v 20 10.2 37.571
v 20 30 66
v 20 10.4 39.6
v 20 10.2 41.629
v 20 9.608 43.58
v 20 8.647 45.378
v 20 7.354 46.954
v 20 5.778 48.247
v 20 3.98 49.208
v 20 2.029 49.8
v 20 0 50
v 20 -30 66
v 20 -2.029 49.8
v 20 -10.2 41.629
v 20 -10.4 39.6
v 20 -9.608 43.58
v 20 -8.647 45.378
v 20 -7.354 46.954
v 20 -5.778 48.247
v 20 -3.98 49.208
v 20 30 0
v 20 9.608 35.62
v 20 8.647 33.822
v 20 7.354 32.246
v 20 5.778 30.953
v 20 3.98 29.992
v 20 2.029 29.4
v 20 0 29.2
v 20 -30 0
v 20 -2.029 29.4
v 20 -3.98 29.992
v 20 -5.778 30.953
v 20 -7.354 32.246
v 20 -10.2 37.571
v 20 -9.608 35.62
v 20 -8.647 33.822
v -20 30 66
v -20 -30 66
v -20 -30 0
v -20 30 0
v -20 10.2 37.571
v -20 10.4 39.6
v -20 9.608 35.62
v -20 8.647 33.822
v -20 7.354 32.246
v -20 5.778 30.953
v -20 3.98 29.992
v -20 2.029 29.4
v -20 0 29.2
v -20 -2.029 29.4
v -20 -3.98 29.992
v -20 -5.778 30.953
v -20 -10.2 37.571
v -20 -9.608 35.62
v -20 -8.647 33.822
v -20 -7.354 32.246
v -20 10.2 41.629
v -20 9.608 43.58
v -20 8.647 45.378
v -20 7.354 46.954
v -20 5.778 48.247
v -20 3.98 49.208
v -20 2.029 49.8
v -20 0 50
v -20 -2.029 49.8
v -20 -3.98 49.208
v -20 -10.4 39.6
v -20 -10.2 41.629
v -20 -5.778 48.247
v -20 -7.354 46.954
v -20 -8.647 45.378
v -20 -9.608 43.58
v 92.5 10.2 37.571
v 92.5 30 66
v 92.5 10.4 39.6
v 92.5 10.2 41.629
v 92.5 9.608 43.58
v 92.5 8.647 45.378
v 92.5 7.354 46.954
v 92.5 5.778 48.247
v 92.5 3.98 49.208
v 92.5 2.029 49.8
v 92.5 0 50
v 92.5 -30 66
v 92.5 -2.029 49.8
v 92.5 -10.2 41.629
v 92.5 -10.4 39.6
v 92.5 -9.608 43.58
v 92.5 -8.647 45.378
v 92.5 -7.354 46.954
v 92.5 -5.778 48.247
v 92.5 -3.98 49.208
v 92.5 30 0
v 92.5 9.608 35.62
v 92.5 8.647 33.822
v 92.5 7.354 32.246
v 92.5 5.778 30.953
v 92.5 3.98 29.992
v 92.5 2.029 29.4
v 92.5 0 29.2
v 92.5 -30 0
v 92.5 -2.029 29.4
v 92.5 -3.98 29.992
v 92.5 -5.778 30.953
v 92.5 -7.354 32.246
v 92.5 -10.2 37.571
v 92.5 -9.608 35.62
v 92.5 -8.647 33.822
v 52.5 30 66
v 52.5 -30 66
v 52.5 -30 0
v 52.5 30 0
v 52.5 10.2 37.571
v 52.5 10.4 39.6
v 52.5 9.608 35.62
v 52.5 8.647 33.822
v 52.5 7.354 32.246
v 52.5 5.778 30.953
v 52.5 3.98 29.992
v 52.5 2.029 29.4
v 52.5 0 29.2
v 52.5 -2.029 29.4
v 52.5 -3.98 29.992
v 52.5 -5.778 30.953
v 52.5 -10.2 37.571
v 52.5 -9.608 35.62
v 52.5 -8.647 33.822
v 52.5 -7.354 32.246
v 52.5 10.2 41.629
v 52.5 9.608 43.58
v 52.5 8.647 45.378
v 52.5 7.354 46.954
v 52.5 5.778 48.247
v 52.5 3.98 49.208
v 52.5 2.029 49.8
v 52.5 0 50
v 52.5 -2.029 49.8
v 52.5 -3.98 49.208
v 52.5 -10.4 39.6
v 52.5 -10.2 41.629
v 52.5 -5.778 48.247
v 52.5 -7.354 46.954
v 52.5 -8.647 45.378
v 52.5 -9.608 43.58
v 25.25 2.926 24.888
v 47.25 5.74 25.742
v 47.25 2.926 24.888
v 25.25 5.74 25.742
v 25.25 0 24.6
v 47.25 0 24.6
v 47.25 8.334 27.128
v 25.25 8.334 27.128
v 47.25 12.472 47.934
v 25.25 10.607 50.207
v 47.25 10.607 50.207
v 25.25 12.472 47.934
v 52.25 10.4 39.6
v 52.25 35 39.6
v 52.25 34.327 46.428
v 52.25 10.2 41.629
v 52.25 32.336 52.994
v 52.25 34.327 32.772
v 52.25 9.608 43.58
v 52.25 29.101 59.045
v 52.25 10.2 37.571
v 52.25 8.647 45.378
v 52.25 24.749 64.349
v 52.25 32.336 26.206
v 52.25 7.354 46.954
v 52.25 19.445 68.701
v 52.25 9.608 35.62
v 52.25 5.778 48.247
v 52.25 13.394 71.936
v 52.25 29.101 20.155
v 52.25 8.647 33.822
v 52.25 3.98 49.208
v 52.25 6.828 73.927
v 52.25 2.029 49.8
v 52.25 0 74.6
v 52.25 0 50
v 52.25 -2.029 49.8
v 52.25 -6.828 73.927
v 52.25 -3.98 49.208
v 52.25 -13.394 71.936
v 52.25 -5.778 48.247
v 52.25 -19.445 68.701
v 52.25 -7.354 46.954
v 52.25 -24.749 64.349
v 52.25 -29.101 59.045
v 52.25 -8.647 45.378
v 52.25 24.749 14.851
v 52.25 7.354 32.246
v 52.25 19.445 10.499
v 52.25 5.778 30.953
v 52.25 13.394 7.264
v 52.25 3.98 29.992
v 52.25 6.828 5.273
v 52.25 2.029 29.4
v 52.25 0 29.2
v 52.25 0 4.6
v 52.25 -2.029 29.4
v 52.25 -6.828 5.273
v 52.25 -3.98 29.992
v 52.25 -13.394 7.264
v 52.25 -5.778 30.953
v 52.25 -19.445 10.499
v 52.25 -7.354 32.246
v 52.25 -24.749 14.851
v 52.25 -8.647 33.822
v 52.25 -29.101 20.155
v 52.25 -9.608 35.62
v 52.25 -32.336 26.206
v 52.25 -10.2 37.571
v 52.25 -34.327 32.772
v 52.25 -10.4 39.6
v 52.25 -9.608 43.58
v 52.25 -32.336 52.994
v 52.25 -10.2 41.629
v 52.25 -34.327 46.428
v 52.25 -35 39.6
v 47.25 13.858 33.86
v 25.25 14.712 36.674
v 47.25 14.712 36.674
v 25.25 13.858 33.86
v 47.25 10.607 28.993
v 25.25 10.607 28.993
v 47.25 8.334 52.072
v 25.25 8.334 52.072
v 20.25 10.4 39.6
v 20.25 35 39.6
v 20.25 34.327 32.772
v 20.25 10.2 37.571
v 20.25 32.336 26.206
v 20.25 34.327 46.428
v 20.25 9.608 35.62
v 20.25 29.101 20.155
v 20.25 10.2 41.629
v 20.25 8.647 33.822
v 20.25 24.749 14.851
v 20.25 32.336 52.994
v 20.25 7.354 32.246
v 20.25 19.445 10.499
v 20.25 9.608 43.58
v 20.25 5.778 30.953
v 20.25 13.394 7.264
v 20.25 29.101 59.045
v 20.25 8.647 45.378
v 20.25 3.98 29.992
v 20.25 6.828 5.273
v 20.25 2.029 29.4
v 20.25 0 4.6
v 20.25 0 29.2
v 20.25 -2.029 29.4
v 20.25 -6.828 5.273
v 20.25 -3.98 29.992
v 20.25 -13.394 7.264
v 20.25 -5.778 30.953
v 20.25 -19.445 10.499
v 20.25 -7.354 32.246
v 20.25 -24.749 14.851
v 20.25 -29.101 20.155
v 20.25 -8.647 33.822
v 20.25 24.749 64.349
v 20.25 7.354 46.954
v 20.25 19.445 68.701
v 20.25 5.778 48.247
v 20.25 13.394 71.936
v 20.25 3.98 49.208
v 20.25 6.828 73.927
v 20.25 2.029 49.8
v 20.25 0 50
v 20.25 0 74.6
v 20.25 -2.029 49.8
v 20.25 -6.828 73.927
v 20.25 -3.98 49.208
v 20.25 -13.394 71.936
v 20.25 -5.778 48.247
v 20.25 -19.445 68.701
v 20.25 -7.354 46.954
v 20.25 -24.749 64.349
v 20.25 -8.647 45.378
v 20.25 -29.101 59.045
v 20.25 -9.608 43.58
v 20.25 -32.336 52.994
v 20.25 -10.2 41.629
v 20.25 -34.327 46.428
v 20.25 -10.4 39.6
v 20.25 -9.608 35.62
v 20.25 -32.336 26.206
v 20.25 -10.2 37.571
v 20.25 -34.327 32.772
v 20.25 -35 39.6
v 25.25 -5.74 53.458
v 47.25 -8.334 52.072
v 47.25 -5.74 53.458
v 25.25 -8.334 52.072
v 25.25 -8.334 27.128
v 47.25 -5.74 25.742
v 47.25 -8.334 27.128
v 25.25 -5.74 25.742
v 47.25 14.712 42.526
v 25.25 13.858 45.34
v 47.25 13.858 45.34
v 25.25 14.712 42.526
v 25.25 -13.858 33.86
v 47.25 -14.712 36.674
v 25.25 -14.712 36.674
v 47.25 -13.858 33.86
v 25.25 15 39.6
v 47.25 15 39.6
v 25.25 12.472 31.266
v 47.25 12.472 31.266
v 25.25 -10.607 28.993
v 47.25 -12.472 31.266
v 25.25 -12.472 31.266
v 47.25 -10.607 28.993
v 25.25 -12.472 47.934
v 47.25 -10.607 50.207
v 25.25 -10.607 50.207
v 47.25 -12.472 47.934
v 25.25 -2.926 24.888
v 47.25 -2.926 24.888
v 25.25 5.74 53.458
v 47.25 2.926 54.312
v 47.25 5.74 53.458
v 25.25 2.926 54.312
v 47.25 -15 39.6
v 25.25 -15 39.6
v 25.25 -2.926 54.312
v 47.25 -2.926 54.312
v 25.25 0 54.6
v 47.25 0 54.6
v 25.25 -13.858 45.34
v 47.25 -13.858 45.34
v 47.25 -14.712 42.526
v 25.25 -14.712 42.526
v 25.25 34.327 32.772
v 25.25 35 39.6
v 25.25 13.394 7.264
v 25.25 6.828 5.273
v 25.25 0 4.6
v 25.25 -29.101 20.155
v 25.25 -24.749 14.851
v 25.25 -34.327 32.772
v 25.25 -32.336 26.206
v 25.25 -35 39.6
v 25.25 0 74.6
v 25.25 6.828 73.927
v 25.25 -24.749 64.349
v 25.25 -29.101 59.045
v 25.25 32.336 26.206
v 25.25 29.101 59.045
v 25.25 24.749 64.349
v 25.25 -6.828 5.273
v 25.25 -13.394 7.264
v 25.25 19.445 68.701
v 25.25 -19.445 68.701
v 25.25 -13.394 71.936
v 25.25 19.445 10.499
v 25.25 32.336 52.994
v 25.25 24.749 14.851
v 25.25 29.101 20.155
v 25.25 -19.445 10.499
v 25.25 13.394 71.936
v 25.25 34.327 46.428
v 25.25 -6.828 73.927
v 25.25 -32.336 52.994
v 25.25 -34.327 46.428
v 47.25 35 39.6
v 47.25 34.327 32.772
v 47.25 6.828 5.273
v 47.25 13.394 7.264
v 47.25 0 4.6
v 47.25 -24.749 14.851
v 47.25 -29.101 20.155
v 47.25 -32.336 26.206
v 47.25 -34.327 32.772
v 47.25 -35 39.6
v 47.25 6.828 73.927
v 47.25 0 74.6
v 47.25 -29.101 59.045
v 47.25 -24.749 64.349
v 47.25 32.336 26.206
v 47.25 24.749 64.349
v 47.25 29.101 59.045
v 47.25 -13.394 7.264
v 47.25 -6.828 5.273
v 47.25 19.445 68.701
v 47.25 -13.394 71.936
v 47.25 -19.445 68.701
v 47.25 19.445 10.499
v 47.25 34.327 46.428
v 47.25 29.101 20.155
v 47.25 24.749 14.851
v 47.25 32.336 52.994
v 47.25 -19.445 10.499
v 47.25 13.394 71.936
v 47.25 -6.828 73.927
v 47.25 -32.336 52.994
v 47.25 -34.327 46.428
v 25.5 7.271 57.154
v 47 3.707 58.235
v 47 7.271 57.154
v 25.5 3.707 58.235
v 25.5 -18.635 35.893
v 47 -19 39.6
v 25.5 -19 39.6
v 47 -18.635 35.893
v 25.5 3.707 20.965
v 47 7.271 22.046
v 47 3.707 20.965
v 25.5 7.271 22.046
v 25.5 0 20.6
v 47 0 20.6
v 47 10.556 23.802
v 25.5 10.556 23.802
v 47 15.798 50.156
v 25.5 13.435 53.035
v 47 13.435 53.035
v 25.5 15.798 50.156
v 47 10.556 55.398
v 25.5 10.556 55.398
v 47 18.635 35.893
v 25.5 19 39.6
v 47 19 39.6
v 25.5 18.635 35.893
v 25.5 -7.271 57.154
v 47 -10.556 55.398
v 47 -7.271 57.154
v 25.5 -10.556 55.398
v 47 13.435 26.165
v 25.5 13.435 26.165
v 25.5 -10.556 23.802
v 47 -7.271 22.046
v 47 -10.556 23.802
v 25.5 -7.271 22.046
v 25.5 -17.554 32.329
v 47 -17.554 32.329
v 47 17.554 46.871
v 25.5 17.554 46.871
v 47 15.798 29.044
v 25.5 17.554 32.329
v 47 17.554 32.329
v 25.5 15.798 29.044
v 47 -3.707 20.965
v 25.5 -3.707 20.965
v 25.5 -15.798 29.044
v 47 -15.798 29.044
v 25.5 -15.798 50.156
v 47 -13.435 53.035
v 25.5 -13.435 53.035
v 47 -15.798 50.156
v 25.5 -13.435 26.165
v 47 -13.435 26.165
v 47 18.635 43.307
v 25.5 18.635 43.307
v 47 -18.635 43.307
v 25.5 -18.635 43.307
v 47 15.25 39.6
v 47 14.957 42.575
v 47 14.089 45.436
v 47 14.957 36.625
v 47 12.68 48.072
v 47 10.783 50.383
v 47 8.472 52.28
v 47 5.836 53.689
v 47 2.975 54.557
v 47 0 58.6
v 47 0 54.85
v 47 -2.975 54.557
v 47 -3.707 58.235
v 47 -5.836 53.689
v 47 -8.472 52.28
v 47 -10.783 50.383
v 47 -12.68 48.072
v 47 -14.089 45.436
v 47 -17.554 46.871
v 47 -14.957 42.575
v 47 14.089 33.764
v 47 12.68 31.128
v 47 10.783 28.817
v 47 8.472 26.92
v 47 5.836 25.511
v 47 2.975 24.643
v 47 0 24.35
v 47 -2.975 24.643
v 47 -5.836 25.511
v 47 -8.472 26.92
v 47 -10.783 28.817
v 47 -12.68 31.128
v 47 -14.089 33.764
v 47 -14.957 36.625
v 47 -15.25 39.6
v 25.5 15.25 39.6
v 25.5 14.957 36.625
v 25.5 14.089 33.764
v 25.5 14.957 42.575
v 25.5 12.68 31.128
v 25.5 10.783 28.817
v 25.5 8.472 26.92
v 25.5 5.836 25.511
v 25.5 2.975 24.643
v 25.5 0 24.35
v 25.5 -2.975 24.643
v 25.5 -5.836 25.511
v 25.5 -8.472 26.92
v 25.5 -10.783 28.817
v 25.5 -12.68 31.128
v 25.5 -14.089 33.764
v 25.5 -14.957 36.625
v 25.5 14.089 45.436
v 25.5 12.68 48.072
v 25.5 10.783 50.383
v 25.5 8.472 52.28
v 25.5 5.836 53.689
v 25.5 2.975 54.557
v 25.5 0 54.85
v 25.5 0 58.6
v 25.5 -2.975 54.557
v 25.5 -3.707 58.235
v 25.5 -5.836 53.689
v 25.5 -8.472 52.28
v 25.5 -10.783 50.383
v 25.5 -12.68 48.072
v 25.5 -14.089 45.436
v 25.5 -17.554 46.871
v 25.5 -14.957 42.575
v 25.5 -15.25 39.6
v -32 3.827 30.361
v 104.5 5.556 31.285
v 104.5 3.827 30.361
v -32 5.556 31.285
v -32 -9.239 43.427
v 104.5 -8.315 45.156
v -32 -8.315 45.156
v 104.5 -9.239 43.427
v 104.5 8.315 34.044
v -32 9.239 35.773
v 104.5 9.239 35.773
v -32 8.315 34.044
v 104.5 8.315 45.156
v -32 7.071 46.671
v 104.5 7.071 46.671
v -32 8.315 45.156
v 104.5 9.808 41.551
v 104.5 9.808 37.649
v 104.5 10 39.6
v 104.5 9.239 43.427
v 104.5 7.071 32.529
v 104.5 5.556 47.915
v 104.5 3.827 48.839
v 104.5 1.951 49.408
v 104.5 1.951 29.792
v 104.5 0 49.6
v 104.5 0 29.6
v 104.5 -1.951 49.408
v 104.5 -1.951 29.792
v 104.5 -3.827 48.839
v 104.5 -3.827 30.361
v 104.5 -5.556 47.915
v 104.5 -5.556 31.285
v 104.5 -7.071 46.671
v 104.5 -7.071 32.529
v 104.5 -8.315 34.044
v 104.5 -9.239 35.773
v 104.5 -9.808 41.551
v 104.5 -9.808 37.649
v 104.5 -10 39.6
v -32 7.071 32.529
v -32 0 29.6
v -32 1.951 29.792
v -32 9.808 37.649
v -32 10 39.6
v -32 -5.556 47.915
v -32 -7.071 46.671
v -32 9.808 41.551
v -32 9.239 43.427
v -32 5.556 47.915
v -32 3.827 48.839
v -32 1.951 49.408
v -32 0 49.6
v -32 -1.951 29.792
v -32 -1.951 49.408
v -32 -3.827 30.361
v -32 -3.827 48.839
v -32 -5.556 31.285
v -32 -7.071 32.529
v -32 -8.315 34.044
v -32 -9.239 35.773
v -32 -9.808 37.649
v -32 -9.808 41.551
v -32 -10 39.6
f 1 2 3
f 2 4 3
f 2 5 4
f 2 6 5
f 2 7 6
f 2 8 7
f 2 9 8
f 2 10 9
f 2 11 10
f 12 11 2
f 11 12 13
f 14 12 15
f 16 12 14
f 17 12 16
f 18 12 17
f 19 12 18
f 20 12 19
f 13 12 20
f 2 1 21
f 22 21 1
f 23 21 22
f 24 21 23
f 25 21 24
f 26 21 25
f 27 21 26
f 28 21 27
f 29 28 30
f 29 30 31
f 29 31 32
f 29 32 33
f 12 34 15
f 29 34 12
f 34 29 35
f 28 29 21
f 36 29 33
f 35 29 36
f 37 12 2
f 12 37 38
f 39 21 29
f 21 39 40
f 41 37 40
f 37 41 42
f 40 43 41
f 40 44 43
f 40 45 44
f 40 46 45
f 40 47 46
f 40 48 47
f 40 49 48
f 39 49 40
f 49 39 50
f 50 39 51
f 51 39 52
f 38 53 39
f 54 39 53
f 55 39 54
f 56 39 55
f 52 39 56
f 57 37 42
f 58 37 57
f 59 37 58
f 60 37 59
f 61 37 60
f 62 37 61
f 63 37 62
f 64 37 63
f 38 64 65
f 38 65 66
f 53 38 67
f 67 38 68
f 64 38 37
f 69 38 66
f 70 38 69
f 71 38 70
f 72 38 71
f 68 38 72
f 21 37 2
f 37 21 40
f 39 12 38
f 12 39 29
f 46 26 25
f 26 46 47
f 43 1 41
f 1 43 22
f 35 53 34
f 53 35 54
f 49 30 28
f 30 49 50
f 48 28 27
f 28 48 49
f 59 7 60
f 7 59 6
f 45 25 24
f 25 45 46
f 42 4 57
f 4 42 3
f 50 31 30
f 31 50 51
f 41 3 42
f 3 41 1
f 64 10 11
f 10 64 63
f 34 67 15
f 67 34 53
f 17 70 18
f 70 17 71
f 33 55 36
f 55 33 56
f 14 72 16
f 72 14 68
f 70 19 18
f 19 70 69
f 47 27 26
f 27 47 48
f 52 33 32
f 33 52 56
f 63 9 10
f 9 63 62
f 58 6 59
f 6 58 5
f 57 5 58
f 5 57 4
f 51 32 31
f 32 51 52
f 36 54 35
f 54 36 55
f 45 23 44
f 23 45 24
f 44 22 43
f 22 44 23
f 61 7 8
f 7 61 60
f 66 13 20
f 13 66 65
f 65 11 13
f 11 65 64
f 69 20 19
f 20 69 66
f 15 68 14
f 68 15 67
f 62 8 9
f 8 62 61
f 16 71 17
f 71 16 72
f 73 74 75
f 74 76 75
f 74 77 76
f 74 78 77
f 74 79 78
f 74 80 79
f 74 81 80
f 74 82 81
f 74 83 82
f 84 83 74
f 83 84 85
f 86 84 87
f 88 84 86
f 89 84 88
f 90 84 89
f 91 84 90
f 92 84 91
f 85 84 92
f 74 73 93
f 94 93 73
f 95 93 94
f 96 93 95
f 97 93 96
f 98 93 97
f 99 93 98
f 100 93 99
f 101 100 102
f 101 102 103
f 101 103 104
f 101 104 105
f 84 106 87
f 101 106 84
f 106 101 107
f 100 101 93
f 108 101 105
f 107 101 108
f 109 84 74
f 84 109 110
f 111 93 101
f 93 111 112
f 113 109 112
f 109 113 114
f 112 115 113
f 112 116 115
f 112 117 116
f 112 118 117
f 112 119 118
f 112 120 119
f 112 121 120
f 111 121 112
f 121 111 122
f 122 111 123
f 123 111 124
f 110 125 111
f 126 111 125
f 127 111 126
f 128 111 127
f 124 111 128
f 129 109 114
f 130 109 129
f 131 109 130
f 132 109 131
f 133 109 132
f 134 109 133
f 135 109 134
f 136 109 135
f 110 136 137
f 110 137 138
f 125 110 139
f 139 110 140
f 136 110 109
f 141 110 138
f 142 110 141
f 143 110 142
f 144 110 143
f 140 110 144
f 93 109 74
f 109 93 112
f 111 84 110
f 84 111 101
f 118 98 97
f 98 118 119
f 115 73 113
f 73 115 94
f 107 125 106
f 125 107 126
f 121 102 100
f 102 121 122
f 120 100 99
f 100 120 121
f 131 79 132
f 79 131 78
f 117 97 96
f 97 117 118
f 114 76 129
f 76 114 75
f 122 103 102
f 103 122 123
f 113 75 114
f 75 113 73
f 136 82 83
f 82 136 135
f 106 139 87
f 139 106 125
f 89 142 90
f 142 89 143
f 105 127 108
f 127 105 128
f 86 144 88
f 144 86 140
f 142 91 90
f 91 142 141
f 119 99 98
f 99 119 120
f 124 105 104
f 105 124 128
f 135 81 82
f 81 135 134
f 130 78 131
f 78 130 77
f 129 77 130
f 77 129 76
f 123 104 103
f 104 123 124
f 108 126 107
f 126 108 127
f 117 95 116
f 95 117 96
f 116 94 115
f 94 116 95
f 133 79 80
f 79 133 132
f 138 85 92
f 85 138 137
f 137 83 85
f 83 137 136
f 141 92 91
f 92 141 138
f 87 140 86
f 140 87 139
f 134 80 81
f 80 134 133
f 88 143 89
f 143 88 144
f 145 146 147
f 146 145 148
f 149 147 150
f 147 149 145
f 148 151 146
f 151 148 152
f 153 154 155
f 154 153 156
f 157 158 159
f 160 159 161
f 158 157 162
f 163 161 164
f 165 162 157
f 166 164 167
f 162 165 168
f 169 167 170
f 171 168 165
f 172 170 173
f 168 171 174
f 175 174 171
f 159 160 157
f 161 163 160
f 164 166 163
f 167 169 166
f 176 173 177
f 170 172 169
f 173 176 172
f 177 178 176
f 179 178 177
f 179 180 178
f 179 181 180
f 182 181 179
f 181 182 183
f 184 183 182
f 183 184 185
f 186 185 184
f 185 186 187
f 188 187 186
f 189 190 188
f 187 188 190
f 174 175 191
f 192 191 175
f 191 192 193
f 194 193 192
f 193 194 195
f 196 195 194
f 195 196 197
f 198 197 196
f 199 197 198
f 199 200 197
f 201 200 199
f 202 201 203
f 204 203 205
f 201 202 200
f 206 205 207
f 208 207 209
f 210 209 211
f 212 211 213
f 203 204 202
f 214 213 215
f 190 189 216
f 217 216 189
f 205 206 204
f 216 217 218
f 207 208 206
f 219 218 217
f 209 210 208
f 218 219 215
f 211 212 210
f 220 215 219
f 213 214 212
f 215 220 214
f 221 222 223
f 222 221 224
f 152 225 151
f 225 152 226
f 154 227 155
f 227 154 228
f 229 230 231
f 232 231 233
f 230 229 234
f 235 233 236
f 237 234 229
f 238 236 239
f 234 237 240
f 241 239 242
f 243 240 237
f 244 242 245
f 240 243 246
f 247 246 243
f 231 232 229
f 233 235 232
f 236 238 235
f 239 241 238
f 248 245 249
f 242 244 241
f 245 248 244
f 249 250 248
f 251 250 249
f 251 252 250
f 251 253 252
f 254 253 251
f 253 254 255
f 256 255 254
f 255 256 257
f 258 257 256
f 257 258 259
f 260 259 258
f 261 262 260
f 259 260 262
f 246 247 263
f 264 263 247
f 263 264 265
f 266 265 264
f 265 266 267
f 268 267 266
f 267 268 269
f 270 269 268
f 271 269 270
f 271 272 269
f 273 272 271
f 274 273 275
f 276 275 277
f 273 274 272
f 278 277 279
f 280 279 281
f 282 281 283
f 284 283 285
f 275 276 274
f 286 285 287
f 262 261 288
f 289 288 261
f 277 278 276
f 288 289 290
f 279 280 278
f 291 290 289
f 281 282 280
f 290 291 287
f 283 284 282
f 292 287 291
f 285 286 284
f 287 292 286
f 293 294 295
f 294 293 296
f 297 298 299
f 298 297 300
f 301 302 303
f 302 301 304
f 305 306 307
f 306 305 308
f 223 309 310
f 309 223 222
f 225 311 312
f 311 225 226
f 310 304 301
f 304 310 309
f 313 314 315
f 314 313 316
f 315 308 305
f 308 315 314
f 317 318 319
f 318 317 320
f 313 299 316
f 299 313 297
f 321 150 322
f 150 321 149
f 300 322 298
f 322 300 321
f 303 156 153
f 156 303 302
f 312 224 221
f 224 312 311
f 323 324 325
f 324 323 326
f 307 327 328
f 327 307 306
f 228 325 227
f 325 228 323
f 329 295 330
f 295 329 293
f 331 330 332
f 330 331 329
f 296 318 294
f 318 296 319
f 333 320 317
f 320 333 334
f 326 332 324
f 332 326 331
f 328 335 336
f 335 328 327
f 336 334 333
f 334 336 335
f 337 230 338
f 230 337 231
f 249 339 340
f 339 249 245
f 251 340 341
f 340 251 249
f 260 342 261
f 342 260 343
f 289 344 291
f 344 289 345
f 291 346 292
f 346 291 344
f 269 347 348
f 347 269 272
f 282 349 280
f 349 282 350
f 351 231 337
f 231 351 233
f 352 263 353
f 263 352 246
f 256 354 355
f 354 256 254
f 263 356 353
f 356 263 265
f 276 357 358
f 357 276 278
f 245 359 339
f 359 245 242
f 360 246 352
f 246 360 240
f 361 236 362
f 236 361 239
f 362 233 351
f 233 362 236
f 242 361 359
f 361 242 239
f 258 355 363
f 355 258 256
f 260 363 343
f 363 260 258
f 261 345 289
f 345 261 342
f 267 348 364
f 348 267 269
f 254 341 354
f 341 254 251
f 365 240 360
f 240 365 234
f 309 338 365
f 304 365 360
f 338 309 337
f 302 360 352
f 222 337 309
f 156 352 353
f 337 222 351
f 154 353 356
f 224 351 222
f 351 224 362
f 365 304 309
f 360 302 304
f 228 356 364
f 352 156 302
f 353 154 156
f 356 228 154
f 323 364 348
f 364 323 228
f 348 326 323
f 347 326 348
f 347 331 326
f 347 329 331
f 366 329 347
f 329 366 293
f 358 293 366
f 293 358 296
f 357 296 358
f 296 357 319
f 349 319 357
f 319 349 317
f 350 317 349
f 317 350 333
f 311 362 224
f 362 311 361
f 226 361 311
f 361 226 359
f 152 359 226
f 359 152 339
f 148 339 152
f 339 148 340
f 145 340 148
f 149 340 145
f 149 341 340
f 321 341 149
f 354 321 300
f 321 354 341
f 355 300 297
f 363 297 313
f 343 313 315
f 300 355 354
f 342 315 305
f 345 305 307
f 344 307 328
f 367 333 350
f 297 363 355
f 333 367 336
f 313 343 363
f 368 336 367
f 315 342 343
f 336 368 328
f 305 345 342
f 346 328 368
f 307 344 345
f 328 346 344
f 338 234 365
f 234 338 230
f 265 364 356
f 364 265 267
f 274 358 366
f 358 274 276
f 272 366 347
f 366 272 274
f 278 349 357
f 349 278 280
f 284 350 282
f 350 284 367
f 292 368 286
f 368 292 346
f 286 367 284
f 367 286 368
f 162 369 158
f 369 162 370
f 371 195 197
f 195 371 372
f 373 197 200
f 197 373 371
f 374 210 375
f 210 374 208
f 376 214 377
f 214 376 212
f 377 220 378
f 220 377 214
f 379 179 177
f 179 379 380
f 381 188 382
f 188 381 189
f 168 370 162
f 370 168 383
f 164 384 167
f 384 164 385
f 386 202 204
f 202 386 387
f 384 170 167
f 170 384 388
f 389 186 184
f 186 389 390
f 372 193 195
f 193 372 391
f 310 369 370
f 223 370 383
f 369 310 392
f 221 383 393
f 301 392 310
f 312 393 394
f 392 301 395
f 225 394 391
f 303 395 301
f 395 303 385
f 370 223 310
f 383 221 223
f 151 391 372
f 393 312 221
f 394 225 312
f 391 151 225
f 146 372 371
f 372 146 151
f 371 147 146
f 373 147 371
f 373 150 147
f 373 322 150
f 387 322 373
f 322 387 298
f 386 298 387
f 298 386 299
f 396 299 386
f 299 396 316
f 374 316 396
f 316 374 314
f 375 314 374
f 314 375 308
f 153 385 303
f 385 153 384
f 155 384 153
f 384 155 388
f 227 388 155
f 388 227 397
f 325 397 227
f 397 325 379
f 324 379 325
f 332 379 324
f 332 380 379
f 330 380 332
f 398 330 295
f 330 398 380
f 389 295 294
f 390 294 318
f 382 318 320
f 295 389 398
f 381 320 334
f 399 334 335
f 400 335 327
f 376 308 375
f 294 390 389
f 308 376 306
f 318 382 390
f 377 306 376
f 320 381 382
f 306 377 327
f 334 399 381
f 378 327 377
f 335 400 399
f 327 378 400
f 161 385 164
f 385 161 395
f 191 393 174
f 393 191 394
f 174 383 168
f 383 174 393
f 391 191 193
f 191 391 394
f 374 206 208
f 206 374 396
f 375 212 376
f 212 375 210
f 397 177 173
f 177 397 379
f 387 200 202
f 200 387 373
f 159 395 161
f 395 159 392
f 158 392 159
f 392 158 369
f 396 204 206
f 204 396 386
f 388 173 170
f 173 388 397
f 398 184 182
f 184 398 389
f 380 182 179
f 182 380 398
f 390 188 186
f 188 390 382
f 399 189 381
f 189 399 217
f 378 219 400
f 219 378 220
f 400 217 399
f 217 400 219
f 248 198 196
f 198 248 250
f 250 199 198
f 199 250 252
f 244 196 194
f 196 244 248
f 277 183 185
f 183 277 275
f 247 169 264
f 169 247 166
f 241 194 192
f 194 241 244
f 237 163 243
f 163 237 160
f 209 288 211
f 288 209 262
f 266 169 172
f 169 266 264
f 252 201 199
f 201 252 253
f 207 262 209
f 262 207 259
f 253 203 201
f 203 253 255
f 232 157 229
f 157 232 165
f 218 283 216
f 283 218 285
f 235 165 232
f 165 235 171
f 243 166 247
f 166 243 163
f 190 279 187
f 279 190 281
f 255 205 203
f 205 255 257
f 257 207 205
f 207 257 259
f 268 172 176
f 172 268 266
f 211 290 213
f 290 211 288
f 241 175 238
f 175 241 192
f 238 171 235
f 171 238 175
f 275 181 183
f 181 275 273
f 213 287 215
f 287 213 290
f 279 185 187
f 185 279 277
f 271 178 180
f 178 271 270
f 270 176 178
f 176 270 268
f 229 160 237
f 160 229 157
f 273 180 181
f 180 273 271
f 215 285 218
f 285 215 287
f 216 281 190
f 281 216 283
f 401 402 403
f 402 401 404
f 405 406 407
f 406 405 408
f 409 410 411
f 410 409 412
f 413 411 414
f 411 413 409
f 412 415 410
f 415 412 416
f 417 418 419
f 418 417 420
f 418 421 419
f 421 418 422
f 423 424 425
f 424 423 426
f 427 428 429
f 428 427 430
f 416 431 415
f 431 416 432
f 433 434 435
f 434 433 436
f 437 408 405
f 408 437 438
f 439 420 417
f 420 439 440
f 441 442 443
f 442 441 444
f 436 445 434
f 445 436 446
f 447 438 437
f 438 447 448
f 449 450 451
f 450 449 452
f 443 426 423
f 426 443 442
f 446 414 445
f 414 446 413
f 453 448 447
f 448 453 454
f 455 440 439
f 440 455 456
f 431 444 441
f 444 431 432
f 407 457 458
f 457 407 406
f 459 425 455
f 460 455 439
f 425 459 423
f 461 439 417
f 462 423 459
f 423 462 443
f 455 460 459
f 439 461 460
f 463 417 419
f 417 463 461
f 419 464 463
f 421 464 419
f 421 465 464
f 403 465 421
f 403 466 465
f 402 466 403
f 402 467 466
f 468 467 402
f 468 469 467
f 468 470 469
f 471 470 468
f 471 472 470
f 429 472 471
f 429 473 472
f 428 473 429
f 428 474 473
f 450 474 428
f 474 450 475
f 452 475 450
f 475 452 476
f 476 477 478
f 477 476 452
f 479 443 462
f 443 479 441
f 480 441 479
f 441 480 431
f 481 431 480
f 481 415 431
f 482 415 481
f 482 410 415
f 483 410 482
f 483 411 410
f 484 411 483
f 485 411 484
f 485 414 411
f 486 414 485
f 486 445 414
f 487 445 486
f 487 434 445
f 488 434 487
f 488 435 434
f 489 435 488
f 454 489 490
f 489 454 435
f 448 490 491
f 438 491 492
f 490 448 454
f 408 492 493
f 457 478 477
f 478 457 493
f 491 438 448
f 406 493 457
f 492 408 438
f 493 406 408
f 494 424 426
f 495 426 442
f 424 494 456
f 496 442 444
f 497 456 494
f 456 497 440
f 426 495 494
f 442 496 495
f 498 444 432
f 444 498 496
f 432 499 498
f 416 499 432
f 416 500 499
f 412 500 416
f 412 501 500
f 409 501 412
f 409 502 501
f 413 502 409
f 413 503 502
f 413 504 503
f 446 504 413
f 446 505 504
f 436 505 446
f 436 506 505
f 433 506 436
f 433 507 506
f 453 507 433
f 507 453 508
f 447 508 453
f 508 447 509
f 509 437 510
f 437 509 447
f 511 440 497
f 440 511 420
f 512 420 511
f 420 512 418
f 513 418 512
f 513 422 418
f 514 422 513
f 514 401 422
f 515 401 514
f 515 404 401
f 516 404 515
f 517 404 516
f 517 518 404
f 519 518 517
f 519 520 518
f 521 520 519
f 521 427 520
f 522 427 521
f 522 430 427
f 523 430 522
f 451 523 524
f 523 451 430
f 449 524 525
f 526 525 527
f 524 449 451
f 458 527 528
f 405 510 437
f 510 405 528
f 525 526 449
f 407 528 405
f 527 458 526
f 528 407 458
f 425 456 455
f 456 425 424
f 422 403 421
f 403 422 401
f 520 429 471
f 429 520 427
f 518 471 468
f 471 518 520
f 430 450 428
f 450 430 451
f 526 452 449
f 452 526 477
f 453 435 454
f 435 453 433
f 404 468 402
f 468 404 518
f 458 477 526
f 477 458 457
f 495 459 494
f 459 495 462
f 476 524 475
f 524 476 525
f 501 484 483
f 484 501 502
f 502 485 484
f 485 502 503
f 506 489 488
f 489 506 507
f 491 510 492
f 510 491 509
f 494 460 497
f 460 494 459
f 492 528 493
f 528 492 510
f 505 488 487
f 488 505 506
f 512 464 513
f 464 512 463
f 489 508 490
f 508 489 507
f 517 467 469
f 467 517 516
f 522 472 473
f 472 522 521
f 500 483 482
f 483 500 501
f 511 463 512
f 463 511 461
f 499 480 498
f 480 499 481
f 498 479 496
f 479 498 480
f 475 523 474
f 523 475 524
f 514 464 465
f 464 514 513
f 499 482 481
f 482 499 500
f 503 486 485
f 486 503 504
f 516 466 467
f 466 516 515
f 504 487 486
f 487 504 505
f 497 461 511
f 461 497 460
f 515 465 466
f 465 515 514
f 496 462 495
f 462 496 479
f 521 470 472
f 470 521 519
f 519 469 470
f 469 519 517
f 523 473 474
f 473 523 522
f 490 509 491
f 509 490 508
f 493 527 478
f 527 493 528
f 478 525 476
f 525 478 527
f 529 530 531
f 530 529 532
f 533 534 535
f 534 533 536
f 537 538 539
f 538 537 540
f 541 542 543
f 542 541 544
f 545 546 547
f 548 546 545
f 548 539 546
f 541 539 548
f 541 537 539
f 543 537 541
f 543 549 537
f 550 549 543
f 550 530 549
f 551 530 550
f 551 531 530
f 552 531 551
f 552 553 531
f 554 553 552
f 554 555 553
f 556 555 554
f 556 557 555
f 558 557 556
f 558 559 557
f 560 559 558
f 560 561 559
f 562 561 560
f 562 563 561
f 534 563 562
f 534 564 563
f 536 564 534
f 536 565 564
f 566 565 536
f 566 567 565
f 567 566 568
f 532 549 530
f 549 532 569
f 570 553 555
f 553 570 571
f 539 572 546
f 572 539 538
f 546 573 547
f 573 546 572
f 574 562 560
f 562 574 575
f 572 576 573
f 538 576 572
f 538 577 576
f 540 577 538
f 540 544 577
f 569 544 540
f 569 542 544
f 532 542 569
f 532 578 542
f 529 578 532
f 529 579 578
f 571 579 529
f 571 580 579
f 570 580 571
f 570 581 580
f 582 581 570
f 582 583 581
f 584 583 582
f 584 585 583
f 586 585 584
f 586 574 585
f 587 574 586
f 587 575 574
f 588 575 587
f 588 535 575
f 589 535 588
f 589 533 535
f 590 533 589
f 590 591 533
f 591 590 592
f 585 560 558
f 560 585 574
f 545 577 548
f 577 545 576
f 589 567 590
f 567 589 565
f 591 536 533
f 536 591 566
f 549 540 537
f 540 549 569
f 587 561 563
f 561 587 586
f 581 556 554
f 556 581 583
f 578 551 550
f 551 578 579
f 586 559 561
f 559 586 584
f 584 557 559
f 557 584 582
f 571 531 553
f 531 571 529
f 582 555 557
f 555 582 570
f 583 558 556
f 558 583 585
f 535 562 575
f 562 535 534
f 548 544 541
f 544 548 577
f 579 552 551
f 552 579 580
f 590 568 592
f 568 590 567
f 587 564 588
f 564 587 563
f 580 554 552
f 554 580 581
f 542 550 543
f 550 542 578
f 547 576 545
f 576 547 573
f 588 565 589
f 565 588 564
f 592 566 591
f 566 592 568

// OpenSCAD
$fn = 32;

// ------------------------------------------------------------------------
// Pulley assembly: d70 pulley with a belt, shaft d20
// Every part is its own module, assembly() places them once.
// ------------------------------------------------------------------------

// --- part 1 ---
module support1() {
  difference() {
    translate([-20, -30, 0]) cube([40, 60, 66]);
    translate([0, 0, 39.6]) rotate([0, 90, 0]) cylinder(h = 42, d = 20.8, center = true);
  }
}

// --- part 2 ---
module support2() {
  difference() {
    translate([-20, -30, 0]) cube([40, 60, 66]);
    translate([0, 0, 39.6]) rotate([0, 90, 0]) cylinder(h = 42, d = 20.8, center = true);
  }
}

// --- part 3 ---
module shaft() {
  translate([0, 0, -68.25]) cylinder(h = 136.5, d = 20);
}

// --- part 4 ---
module pulley() {
  difference() {
    union() {
      cylinder(h = 32, d = 30);
      cylinder(h = 5, d = 70);
      translate([0, 0, 27]) cylinder(h = 5, d = 70);
    }
    translate([0, 0, -1]) cylinder(h = 34, d = 20.8);
  }
}

// --- part 5 ---
module belt() {
  difference() {
      translate([0, 0, 0]) cylinder(h = 21.5, d = 38);
      translate([0, 0, -1]) cylinder(h = 23.5, d = 30.5);
    }
}

// --- assembly ---
module assembly() {
  translate([0, 0, 0]) rotate([0, 0, 0]) support1();
  translate([72.5, 0, 0]) rotate([0, 0, 0]) support2();
  translate([36.25, 0, 39.6]) rotate([0, 90, 0]) shaft();
  translate([20.25, 0, 39.6]) rotate([0, 90, 0]) pulley();
  translate([25.5, 0, 39.6]) rotate([0, 90, 0]) belt();
}

assembly();
